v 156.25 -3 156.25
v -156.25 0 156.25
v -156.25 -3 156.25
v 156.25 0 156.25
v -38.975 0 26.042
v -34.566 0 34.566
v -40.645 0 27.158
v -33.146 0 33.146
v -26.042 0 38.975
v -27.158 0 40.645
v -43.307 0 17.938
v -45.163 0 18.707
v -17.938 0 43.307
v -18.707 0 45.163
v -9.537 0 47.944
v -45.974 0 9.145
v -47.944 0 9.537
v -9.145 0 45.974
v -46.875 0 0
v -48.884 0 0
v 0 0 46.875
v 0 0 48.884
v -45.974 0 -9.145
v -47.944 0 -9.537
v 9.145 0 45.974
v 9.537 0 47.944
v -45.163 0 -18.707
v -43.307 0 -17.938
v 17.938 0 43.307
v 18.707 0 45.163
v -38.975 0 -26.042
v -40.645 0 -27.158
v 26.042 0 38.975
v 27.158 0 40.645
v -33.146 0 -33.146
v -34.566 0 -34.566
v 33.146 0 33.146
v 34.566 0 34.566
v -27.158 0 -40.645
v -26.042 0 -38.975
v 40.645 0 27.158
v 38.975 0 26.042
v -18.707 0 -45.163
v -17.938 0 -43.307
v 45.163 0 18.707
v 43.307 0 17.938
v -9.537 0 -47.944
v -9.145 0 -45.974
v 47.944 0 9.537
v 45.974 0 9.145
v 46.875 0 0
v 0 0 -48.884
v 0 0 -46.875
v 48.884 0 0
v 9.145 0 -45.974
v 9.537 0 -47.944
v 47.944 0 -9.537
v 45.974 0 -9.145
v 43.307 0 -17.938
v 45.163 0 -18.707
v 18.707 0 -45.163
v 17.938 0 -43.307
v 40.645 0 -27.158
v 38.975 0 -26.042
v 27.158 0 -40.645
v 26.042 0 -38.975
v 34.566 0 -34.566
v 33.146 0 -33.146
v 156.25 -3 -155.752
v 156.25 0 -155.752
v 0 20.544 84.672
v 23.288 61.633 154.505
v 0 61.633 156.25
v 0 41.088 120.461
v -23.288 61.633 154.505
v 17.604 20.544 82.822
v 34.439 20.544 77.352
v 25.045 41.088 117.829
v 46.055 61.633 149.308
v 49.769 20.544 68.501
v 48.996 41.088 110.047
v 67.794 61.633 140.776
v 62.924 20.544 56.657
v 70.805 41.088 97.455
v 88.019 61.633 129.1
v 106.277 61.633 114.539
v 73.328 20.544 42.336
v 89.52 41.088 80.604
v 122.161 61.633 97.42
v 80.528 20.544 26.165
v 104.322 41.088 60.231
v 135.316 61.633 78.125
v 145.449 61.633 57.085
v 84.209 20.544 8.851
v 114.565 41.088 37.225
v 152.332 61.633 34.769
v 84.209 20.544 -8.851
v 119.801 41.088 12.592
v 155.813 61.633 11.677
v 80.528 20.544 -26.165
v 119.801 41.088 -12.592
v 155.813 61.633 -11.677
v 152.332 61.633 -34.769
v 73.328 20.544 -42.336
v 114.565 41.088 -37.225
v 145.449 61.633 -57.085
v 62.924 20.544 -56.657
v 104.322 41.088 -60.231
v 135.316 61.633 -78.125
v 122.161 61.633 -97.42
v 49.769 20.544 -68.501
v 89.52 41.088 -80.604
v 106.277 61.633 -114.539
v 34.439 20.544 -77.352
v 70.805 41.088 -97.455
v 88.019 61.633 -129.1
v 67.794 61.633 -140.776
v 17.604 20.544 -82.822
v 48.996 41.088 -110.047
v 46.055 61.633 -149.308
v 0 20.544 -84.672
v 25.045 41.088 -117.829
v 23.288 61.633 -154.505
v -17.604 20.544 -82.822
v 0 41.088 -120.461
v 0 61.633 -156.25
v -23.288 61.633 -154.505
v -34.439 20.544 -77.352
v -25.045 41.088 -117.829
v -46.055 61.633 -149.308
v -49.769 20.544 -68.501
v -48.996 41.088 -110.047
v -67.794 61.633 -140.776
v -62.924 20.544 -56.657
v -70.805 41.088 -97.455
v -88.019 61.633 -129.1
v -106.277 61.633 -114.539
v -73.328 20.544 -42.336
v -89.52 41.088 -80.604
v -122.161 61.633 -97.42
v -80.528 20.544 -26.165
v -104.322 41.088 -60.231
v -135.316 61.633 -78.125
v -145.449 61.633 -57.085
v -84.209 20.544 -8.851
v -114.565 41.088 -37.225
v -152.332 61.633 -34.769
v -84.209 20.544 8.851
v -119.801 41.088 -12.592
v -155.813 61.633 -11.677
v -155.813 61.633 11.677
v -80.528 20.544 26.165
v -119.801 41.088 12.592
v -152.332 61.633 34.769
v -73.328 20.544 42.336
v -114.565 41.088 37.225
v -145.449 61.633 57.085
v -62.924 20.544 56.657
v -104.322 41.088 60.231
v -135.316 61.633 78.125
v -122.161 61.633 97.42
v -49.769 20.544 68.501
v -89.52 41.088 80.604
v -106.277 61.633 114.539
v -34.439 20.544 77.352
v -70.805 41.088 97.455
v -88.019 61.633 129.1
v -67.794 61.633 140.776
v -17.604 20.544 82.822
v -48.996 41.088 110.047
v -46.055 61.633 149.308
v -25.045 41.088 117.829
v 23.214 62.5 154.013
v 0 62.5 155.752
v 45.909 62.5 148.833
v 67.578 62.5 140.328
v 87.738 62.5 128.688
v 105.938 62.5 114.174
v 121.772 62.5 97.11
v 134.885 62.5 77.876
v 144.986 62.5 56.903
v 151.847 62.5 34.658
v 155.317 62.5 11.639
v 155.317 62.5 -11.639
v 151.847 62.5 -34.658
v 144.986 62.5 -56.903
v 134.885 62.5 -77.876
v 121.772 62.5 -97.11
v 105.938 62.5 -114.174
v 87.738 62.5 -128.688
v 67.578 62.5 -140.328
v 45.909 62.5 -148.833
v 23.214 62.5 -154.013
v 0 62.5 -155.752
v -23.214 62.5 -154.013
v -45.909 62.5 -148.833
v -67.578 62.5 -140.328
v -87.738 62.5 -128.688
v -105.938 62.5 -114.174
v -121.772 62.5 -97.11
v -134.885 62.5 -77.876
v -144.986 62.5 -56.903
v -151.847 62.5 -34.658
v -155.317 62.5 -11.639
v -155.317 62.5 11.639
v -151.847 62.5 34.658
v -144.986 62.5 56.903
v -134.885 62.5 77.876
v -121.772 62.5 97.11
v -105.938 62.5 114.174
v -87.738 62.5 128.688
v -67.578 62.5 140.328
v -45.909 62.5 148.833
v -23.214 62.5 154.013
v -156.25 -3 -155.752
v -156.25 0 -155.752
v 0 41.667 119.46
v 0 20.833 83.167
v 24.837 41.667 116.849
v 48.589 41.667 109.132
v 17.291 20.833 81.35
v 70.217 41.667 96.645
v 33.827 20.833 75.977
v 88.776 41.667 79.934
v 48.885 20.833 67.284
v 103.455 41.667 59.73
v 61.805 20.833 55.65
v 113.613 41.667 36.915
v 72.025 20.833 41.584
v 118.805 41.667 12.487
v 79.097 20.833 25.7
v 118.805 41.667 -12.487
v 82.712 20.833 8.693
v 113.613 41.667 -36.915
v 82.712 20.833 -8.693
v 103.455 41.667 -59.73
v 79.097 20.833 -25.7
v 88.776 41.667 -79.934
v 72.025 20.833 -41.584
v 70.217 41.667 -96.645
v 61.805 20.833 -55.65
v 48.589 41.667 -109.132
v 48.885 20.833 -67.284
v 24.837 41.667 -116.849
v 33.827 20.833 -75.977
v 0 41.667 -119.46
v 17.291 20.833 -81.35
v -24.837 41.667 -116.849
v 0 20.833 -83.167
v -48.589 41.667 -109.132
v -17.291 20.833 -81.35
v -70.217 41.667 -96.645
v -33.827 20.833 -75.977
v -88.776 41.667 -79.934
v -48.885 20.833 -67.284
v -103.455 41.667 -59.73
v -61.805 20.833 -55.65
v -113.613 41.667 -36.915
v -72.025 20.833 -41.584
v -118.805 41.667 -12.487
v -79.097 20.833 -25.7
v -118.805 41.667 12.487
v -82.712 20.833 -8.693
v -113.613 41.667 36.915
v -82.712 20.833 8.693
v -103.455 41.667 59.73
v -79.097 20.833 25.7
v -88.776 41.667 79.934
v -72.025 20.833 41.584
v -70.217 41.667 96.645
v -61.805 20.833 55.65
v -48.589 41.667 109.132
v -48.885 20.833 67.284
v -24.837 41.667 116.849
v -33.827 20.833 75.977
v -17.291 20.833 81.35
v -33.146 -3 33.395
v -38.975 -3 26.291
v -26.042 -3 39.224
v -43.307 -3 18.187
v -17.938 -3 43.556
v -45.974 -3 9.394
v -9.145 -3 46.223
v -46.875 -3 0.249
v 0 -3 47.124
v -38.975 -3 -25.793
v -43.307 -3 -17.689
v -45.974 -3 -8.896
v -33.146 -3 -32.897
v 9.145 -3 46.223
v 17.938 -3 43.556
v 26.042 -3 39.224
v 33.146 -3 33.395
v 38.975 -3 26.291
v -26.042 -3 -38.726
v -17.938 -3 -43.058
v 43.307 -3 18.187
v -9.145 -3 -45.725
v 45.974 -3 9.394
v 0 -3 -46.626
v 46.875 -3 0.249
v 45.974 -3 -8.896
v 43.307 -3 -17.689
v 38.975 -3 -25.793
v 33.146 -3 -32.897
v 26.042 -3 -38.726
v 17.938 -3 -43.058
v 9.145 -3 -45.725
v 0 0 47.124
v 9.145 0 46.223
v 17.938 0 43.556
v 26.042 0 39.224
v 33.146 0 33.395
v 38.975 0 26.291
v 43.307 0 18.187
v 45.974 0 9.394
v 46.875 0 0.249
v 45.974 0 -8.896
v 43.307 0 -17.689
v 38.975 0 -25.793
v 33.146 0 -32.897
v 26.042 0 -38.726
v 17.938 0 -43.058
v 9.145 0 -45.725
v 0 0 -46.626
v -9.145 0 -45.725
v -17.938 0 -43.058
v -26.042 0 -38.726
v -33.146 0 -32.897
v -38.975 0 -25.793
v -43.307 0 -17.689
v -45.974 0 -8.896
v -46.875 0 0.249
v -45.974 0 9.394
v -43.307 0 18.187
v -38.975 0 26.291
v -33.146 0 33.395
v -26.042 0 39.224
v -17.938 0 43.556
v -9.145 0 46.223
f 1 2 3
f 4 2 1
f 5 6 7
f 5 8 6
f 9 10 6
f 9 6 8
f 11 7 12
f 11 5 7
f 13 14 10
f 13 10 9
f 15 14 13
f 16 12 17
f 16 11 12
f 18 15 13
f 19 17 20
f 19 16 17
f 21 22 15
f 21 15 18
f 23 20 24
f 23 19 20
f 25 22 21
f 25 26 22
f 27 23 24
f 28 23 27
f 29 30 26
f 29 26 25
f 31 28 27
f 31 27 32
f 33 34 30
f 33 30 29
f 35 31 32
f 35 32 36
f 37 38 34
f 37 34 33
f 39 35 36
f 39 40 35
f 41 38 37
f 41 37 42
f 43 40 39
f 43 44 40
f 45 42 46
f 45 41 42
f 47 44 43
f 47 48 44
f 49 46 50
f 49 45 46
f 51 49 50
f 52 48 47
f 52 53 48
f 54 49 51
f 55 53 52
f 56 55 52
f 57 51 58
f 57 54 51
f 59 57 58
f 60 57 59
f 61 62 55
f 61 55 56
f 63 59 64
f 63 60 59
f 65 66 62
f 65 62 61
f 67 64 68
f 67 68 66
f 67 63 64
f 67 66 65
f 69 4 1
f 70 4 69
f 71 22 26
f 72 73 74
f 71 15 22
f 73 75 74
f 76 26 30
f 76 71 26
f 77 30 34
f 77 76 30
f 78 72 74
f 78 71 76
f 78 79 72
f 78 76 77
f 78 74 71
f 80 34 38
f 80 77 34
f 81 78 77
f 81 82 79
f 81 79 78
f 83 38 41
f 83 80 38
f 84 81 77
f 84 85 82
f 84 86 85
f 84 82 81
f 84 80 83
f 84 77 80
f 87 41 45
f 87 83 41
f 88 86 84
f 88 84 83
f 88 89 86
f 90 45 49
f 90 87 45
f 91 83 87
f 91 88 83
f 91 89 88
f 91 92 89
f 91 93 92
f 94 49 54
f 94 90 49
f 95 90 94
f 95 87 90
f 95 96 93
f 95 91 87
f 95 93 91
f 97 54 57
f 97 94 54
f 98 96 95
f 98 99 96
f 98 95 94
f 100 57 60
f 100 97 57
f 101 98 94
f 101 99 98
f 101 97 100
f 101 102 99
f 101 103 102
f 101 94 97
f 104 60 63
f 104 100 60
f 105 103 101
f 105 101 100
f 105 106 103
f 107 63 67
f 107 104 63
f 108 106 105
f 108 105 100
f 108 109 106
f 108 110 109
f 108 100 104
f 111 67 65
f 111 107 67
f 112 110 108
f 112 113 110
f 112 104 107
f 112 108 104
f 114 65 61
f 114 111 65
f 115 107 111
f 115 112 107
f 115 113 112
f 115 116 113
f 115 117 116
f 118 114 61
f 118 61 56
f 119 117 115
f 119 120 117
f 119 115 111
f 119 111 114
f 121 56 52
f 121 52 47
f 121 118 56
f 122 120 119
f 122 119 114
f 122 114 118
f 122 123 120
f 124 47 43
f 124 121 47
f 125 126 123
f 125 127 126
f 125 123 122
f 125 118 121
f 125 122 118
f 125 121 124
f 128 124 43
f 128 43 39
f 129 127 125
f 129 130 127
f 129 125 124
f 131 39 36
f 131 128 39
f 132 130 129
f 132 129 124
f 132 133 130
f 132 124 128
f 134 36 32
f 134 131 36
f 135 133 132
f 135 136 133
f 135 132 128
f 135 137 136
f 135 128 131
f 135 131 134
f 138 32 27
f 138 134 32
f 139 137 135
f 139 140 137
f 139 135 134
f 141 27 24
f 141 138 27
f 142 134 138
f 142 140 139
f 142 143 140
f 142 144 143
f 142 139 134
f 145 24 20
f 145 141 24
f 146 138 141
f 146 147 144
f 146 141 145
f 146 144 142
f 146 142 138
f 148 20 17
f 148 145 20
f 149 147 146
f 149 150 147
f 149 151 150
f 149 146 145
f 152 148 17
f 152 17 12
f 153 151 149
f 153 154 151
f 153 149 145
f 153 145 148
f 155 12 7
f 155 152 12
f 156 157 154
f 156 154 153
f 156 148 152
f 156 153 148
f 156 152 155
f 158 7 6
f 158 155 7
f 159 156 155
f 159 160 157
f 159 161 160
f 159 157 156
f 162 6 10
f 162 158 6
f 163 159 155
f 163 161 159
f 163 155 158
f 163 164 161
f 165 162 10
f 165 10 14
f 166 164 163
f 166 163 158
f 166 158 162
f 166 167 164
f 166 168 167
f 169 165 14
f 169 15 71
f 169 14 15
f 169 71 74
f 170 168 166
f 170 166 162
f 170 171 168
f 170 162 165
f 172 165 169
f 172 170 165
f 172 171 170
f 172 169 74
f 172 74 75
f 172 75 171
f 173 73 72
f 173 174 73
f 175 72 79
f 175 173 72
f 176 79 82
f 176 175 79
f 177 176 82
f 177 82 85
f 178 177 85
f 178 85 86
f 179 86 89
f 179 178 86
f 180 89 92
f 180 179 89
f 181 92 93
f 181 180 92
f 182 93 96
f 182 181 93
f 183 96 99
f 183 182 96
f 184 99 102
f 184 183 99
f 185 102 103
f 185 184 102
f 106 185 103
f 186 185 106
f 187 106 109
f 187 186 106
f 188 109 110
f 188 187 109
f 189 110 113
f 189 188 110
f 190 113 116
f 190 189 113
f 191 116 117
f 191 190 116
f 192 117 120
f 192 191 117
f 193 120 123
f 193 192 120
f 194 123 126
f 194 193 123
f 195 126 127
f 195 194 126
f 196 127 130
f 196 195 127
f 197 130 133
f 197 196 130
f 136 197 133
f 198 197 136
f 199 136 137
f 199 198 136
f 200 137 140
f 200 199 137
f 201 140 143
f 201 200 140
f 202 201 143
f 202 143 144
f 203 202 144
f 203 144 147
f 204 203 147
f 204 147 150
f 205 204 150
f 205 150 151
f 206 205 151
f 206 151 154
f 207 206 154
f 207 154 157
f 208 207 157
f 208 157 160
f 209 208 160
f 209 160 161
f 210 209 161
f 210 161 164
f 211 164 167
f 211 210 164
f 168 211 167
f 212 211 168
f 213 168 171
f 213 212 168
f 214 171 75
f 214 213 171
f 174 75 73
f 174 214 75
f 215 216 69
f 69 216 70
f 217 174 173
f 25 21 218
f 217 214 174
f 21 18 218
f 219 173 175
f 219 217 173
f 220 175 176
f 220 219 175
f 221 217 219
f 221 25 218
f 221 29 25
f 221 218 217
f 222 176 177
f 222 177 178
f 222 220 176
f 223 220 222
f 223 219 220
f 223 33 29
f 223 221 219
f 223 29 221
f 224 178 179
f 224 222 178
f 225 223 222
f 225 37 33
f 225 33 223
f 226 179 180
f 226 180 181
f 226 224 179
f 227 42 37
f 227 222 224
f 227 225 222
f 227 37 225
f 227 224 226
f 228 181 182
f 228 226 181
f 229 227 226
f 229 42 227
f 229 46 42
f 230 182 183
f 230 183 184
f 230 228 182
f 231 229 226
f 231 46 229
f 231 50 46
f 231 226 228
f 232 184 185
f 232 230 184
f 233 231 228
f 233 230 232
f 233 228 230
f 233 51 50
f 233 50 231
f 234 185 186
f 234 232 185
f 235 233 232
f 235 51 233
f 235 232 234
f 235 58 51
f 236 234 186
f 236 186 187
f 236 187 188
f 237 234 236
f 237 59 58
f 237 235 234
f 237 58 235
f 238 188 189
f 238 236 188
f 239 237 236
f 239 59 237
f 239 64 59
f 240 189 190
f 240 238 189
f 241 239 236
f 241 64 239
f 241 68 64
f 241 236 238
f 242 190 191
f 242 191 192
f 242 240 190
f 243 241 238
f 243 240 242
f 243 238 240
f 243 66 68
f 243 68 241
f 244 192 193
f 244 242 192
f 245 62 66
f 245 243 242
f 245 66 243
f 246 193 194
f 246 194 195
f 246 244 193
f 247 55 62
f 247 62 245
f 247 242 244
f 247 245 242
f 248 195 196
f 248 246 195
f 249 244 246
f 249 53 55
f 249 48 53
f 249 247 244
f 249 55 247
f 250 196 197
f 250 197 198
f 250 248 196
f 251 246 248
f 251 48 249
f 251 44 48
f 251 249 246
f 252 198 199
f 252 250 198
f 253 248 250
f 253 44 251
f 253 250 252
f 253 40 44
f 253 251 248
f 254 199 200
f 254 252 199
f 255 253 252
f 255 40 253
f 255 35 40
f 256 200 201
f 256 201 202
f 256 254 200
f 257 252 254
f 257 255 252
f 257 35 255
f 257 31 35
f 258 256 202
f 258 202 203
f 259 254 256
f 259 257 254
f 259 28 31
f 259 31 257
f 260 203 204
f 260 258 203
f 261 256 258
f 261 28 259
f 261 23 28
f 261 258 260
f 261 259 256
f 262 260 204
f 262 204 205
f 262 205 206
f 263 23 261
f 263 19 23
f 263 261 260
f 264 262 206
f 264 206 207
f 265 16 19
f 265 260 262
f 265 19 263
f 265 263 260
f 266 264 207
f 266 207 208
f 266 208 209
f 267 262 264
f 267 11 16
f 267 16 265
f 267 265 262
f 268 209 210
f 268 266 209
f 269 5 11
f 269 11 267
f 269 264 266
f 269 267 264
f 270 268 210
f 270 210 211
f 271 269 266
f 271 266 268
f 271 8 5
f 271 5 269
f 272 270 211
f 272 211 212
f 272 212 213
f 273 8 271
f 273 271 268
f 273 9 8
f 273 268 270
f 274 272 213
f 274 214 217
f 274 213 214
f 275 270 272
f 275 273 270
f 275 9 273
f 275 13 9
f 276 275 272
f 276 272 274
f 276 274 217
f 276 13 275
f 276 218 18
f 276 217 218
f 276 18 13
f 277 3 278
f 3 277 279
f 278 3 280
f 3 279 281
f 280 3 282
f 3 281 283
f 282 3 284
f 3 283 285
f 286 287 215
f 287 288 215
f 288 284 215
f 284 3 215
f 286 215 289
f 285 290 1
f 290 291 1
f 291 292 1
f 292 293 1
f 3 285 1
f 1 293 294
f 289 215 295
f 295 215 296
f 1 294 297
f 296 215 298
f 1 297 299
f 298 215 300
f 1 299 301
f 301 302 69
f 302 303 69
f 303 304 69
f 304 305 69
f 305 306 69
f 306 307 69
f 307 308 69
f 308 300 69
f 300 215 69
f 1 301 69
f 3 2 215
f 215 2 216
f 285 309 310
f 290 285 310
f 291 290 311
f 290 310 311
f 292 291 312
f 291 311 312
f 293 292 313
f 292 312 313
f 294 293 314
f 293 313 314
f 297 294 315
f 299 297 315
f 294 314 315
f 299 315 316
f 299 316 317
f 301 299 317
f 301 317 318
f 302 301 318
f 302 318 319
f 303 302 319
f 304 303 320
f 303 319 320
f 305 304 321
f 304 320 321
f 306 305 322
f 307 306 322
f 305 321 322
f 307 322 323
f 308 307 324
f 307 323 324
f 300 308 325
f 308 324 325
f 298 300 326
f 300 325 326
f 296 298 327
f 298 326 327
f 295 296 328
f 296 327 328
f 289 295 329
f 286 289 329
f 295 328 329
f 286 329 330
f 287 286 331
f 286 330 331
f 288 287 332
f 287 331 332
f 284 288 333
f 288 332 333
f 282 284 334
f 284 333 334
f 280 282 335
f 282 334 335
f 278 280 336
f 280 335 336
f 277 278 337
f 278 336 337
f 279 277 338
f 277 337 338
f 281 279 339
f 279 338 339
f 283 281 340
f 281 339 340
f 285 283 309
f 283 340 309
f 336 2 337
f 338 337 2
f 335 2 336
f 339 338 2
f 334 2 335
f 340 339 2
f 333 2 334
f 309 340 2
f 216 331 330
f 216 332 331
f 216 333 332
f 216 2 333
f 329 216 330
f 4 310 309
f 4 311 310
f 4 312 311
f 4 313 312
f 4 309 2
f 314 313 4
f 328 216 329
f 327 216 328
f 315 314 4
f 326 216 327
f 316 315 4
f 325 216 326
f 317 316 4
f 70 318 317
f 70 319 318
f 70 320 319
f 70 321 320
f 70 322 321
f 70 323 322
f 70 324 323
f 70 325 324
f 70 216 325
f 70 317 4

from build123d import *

# Parameters (mm, degrees)
SKETCH2_W           = 312.5
SKETCH2_H           = 312.002153757
SKETCH2_R           = 46.875
BOSS_EXTRUDE1_DEPTH = 3


with BuildPart() as part:
    # Sketch1 → Revolve1 (revolve)
    with BuildSketch(Plane.XY, mode=Mode.PRIVATE) as revolve1_sk:
        Polygon((-48.883652299, 0), (-156.25, 61.63273469), (-155.752153757, 62.5), (-46.875, 0), align=None)
    revolve(revolve1_sk.sketch.rotate(Axis((0, 0, 0), (0, 1, 0)), 90), axis=Axis((0, 0, 0), (0, 1, 0)))


with BuildPart() as body_2:
    # Sketch2 → Boss-Extrude1 (new body)
    with BuildSketch(Plane(origin=(0, 0, 0), x_dir=(1, 0, 0), z_dir=(0, 1, 0))):
        with Locations((0, -0.248923121)):
            Rectangle(SKETCH2_W, SKETCH2_H)
        with Locations(Location((0, -0.248923121, 0), (0, 0, 270))):
            Circle(SKETCH2_R, mode=Mode.SUBTRACT)
    extrude(amount=-BOSS_EXTRUDE1_DEPTH)


solid = Compound([part.part, body_2.part])
